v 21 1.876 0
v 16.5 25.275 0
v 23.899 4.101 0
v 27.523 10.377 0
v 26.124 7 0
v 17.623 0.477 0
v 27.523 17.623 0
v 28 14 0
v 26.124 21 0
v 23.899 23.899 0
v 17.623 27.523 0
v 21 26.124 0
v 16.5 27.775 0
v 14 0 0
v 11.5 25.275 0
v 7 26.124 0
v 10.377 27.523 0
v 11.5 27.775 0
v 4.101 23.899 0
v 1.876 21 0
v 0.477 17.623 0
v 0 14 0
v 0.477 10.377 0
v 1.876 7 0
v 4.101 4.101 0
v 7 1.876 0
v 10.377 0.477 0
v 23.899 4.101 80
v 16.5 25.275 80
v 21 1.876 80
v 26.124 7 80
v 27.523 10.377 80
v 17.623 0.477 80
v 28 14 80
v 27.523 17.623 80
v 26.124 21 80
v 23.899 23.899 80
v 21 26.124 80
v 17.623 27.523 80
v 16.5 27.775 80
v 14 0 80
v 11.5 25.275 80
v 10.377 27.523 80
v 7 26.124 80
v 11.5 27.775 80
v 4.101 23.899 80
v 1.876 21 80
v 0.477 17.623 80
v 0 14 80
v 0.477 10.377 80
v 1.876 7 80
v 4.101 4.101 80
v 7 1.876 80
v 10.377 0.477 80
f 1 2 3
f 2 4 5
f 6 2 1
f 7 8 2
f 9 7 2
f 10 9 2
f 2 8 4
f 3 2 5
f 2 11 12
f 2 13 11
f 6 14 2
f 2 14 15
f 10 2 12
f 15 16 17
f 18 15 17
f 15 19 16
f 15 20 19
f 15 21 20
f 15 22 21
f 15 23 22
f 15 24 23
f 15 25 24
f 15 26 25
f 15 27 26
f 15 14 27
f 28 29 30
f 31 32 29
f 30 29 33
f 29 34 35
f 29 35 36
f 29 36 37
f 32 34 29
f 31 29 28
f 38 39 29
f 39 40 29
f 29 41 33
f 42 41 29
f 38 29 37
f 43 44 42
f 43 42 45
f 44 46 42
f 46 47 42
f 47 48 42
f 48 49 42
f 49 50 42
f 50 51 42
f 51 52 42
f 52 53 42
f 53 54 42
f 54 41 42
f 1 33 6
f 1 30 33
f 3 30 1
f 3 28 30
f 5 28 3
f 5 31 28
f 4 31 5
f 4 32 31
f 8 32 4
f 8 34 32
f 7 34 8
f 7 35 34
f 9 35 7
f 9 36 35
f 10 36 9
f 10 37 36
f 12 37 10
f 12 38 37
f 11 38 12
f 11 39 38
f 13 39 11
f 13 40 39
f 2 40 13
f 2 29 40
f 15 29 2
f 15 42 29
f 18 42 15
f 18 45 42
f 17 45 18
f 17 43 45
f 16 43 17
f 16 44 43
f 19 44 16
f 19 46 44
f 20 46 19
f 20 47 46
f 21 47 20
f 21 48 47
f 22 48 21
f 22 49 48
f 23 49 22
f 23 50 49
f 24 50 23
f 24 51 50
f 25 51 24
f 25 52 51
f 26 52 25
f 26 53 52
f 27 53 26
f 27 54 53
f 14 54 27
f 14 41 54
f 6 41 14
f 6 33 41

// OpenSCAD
$fn = 32;

// ----------------------------------------------------------------------
// Keyway shaft: d28 shaft, key 5 x 2.5 mm
// ----------------------------------------------------------------------

// --- parameters (mm) ---
shaft_r = 14;             // shaft radius
key_w = 5;                // keyway width
key_d = 2.5;              // keyway depth below the surface line
plate_t = 80;             // shaft length, Z (extrusion height)

shaft_d = 2 * shaft_r;  // shaft diameter
circle_step = 15;  // polygon sampling step, degrees

profile = [[10.377, 27.523], [7, 26.124], [4.101, 23.899], [1.876, 21], [0.477, 17.623], [0, 14], [0.477, 10.377], [1.876, 7], [4.101, 4.101], [7, 1.876], [10.377, 0.477], [14, 0], [17.623, 0.477], [21, 1.876], [23.899, 4.101], [26.124, 7], [27.523, 10.377], [28, 14], [27.523, 17.623], [26.124, 21], [23.899, 23.899], [21, 26.124], [17.623, 27.523], [16.5, 27.775], [16.5, 25.275], [11.5, 25.275], [11.5, 27.775]];  // primary outline, 27 points, counter clockwise

// --- the one profile operation ---
linear_extrude(height = plate_t) polygon(points = profile);
